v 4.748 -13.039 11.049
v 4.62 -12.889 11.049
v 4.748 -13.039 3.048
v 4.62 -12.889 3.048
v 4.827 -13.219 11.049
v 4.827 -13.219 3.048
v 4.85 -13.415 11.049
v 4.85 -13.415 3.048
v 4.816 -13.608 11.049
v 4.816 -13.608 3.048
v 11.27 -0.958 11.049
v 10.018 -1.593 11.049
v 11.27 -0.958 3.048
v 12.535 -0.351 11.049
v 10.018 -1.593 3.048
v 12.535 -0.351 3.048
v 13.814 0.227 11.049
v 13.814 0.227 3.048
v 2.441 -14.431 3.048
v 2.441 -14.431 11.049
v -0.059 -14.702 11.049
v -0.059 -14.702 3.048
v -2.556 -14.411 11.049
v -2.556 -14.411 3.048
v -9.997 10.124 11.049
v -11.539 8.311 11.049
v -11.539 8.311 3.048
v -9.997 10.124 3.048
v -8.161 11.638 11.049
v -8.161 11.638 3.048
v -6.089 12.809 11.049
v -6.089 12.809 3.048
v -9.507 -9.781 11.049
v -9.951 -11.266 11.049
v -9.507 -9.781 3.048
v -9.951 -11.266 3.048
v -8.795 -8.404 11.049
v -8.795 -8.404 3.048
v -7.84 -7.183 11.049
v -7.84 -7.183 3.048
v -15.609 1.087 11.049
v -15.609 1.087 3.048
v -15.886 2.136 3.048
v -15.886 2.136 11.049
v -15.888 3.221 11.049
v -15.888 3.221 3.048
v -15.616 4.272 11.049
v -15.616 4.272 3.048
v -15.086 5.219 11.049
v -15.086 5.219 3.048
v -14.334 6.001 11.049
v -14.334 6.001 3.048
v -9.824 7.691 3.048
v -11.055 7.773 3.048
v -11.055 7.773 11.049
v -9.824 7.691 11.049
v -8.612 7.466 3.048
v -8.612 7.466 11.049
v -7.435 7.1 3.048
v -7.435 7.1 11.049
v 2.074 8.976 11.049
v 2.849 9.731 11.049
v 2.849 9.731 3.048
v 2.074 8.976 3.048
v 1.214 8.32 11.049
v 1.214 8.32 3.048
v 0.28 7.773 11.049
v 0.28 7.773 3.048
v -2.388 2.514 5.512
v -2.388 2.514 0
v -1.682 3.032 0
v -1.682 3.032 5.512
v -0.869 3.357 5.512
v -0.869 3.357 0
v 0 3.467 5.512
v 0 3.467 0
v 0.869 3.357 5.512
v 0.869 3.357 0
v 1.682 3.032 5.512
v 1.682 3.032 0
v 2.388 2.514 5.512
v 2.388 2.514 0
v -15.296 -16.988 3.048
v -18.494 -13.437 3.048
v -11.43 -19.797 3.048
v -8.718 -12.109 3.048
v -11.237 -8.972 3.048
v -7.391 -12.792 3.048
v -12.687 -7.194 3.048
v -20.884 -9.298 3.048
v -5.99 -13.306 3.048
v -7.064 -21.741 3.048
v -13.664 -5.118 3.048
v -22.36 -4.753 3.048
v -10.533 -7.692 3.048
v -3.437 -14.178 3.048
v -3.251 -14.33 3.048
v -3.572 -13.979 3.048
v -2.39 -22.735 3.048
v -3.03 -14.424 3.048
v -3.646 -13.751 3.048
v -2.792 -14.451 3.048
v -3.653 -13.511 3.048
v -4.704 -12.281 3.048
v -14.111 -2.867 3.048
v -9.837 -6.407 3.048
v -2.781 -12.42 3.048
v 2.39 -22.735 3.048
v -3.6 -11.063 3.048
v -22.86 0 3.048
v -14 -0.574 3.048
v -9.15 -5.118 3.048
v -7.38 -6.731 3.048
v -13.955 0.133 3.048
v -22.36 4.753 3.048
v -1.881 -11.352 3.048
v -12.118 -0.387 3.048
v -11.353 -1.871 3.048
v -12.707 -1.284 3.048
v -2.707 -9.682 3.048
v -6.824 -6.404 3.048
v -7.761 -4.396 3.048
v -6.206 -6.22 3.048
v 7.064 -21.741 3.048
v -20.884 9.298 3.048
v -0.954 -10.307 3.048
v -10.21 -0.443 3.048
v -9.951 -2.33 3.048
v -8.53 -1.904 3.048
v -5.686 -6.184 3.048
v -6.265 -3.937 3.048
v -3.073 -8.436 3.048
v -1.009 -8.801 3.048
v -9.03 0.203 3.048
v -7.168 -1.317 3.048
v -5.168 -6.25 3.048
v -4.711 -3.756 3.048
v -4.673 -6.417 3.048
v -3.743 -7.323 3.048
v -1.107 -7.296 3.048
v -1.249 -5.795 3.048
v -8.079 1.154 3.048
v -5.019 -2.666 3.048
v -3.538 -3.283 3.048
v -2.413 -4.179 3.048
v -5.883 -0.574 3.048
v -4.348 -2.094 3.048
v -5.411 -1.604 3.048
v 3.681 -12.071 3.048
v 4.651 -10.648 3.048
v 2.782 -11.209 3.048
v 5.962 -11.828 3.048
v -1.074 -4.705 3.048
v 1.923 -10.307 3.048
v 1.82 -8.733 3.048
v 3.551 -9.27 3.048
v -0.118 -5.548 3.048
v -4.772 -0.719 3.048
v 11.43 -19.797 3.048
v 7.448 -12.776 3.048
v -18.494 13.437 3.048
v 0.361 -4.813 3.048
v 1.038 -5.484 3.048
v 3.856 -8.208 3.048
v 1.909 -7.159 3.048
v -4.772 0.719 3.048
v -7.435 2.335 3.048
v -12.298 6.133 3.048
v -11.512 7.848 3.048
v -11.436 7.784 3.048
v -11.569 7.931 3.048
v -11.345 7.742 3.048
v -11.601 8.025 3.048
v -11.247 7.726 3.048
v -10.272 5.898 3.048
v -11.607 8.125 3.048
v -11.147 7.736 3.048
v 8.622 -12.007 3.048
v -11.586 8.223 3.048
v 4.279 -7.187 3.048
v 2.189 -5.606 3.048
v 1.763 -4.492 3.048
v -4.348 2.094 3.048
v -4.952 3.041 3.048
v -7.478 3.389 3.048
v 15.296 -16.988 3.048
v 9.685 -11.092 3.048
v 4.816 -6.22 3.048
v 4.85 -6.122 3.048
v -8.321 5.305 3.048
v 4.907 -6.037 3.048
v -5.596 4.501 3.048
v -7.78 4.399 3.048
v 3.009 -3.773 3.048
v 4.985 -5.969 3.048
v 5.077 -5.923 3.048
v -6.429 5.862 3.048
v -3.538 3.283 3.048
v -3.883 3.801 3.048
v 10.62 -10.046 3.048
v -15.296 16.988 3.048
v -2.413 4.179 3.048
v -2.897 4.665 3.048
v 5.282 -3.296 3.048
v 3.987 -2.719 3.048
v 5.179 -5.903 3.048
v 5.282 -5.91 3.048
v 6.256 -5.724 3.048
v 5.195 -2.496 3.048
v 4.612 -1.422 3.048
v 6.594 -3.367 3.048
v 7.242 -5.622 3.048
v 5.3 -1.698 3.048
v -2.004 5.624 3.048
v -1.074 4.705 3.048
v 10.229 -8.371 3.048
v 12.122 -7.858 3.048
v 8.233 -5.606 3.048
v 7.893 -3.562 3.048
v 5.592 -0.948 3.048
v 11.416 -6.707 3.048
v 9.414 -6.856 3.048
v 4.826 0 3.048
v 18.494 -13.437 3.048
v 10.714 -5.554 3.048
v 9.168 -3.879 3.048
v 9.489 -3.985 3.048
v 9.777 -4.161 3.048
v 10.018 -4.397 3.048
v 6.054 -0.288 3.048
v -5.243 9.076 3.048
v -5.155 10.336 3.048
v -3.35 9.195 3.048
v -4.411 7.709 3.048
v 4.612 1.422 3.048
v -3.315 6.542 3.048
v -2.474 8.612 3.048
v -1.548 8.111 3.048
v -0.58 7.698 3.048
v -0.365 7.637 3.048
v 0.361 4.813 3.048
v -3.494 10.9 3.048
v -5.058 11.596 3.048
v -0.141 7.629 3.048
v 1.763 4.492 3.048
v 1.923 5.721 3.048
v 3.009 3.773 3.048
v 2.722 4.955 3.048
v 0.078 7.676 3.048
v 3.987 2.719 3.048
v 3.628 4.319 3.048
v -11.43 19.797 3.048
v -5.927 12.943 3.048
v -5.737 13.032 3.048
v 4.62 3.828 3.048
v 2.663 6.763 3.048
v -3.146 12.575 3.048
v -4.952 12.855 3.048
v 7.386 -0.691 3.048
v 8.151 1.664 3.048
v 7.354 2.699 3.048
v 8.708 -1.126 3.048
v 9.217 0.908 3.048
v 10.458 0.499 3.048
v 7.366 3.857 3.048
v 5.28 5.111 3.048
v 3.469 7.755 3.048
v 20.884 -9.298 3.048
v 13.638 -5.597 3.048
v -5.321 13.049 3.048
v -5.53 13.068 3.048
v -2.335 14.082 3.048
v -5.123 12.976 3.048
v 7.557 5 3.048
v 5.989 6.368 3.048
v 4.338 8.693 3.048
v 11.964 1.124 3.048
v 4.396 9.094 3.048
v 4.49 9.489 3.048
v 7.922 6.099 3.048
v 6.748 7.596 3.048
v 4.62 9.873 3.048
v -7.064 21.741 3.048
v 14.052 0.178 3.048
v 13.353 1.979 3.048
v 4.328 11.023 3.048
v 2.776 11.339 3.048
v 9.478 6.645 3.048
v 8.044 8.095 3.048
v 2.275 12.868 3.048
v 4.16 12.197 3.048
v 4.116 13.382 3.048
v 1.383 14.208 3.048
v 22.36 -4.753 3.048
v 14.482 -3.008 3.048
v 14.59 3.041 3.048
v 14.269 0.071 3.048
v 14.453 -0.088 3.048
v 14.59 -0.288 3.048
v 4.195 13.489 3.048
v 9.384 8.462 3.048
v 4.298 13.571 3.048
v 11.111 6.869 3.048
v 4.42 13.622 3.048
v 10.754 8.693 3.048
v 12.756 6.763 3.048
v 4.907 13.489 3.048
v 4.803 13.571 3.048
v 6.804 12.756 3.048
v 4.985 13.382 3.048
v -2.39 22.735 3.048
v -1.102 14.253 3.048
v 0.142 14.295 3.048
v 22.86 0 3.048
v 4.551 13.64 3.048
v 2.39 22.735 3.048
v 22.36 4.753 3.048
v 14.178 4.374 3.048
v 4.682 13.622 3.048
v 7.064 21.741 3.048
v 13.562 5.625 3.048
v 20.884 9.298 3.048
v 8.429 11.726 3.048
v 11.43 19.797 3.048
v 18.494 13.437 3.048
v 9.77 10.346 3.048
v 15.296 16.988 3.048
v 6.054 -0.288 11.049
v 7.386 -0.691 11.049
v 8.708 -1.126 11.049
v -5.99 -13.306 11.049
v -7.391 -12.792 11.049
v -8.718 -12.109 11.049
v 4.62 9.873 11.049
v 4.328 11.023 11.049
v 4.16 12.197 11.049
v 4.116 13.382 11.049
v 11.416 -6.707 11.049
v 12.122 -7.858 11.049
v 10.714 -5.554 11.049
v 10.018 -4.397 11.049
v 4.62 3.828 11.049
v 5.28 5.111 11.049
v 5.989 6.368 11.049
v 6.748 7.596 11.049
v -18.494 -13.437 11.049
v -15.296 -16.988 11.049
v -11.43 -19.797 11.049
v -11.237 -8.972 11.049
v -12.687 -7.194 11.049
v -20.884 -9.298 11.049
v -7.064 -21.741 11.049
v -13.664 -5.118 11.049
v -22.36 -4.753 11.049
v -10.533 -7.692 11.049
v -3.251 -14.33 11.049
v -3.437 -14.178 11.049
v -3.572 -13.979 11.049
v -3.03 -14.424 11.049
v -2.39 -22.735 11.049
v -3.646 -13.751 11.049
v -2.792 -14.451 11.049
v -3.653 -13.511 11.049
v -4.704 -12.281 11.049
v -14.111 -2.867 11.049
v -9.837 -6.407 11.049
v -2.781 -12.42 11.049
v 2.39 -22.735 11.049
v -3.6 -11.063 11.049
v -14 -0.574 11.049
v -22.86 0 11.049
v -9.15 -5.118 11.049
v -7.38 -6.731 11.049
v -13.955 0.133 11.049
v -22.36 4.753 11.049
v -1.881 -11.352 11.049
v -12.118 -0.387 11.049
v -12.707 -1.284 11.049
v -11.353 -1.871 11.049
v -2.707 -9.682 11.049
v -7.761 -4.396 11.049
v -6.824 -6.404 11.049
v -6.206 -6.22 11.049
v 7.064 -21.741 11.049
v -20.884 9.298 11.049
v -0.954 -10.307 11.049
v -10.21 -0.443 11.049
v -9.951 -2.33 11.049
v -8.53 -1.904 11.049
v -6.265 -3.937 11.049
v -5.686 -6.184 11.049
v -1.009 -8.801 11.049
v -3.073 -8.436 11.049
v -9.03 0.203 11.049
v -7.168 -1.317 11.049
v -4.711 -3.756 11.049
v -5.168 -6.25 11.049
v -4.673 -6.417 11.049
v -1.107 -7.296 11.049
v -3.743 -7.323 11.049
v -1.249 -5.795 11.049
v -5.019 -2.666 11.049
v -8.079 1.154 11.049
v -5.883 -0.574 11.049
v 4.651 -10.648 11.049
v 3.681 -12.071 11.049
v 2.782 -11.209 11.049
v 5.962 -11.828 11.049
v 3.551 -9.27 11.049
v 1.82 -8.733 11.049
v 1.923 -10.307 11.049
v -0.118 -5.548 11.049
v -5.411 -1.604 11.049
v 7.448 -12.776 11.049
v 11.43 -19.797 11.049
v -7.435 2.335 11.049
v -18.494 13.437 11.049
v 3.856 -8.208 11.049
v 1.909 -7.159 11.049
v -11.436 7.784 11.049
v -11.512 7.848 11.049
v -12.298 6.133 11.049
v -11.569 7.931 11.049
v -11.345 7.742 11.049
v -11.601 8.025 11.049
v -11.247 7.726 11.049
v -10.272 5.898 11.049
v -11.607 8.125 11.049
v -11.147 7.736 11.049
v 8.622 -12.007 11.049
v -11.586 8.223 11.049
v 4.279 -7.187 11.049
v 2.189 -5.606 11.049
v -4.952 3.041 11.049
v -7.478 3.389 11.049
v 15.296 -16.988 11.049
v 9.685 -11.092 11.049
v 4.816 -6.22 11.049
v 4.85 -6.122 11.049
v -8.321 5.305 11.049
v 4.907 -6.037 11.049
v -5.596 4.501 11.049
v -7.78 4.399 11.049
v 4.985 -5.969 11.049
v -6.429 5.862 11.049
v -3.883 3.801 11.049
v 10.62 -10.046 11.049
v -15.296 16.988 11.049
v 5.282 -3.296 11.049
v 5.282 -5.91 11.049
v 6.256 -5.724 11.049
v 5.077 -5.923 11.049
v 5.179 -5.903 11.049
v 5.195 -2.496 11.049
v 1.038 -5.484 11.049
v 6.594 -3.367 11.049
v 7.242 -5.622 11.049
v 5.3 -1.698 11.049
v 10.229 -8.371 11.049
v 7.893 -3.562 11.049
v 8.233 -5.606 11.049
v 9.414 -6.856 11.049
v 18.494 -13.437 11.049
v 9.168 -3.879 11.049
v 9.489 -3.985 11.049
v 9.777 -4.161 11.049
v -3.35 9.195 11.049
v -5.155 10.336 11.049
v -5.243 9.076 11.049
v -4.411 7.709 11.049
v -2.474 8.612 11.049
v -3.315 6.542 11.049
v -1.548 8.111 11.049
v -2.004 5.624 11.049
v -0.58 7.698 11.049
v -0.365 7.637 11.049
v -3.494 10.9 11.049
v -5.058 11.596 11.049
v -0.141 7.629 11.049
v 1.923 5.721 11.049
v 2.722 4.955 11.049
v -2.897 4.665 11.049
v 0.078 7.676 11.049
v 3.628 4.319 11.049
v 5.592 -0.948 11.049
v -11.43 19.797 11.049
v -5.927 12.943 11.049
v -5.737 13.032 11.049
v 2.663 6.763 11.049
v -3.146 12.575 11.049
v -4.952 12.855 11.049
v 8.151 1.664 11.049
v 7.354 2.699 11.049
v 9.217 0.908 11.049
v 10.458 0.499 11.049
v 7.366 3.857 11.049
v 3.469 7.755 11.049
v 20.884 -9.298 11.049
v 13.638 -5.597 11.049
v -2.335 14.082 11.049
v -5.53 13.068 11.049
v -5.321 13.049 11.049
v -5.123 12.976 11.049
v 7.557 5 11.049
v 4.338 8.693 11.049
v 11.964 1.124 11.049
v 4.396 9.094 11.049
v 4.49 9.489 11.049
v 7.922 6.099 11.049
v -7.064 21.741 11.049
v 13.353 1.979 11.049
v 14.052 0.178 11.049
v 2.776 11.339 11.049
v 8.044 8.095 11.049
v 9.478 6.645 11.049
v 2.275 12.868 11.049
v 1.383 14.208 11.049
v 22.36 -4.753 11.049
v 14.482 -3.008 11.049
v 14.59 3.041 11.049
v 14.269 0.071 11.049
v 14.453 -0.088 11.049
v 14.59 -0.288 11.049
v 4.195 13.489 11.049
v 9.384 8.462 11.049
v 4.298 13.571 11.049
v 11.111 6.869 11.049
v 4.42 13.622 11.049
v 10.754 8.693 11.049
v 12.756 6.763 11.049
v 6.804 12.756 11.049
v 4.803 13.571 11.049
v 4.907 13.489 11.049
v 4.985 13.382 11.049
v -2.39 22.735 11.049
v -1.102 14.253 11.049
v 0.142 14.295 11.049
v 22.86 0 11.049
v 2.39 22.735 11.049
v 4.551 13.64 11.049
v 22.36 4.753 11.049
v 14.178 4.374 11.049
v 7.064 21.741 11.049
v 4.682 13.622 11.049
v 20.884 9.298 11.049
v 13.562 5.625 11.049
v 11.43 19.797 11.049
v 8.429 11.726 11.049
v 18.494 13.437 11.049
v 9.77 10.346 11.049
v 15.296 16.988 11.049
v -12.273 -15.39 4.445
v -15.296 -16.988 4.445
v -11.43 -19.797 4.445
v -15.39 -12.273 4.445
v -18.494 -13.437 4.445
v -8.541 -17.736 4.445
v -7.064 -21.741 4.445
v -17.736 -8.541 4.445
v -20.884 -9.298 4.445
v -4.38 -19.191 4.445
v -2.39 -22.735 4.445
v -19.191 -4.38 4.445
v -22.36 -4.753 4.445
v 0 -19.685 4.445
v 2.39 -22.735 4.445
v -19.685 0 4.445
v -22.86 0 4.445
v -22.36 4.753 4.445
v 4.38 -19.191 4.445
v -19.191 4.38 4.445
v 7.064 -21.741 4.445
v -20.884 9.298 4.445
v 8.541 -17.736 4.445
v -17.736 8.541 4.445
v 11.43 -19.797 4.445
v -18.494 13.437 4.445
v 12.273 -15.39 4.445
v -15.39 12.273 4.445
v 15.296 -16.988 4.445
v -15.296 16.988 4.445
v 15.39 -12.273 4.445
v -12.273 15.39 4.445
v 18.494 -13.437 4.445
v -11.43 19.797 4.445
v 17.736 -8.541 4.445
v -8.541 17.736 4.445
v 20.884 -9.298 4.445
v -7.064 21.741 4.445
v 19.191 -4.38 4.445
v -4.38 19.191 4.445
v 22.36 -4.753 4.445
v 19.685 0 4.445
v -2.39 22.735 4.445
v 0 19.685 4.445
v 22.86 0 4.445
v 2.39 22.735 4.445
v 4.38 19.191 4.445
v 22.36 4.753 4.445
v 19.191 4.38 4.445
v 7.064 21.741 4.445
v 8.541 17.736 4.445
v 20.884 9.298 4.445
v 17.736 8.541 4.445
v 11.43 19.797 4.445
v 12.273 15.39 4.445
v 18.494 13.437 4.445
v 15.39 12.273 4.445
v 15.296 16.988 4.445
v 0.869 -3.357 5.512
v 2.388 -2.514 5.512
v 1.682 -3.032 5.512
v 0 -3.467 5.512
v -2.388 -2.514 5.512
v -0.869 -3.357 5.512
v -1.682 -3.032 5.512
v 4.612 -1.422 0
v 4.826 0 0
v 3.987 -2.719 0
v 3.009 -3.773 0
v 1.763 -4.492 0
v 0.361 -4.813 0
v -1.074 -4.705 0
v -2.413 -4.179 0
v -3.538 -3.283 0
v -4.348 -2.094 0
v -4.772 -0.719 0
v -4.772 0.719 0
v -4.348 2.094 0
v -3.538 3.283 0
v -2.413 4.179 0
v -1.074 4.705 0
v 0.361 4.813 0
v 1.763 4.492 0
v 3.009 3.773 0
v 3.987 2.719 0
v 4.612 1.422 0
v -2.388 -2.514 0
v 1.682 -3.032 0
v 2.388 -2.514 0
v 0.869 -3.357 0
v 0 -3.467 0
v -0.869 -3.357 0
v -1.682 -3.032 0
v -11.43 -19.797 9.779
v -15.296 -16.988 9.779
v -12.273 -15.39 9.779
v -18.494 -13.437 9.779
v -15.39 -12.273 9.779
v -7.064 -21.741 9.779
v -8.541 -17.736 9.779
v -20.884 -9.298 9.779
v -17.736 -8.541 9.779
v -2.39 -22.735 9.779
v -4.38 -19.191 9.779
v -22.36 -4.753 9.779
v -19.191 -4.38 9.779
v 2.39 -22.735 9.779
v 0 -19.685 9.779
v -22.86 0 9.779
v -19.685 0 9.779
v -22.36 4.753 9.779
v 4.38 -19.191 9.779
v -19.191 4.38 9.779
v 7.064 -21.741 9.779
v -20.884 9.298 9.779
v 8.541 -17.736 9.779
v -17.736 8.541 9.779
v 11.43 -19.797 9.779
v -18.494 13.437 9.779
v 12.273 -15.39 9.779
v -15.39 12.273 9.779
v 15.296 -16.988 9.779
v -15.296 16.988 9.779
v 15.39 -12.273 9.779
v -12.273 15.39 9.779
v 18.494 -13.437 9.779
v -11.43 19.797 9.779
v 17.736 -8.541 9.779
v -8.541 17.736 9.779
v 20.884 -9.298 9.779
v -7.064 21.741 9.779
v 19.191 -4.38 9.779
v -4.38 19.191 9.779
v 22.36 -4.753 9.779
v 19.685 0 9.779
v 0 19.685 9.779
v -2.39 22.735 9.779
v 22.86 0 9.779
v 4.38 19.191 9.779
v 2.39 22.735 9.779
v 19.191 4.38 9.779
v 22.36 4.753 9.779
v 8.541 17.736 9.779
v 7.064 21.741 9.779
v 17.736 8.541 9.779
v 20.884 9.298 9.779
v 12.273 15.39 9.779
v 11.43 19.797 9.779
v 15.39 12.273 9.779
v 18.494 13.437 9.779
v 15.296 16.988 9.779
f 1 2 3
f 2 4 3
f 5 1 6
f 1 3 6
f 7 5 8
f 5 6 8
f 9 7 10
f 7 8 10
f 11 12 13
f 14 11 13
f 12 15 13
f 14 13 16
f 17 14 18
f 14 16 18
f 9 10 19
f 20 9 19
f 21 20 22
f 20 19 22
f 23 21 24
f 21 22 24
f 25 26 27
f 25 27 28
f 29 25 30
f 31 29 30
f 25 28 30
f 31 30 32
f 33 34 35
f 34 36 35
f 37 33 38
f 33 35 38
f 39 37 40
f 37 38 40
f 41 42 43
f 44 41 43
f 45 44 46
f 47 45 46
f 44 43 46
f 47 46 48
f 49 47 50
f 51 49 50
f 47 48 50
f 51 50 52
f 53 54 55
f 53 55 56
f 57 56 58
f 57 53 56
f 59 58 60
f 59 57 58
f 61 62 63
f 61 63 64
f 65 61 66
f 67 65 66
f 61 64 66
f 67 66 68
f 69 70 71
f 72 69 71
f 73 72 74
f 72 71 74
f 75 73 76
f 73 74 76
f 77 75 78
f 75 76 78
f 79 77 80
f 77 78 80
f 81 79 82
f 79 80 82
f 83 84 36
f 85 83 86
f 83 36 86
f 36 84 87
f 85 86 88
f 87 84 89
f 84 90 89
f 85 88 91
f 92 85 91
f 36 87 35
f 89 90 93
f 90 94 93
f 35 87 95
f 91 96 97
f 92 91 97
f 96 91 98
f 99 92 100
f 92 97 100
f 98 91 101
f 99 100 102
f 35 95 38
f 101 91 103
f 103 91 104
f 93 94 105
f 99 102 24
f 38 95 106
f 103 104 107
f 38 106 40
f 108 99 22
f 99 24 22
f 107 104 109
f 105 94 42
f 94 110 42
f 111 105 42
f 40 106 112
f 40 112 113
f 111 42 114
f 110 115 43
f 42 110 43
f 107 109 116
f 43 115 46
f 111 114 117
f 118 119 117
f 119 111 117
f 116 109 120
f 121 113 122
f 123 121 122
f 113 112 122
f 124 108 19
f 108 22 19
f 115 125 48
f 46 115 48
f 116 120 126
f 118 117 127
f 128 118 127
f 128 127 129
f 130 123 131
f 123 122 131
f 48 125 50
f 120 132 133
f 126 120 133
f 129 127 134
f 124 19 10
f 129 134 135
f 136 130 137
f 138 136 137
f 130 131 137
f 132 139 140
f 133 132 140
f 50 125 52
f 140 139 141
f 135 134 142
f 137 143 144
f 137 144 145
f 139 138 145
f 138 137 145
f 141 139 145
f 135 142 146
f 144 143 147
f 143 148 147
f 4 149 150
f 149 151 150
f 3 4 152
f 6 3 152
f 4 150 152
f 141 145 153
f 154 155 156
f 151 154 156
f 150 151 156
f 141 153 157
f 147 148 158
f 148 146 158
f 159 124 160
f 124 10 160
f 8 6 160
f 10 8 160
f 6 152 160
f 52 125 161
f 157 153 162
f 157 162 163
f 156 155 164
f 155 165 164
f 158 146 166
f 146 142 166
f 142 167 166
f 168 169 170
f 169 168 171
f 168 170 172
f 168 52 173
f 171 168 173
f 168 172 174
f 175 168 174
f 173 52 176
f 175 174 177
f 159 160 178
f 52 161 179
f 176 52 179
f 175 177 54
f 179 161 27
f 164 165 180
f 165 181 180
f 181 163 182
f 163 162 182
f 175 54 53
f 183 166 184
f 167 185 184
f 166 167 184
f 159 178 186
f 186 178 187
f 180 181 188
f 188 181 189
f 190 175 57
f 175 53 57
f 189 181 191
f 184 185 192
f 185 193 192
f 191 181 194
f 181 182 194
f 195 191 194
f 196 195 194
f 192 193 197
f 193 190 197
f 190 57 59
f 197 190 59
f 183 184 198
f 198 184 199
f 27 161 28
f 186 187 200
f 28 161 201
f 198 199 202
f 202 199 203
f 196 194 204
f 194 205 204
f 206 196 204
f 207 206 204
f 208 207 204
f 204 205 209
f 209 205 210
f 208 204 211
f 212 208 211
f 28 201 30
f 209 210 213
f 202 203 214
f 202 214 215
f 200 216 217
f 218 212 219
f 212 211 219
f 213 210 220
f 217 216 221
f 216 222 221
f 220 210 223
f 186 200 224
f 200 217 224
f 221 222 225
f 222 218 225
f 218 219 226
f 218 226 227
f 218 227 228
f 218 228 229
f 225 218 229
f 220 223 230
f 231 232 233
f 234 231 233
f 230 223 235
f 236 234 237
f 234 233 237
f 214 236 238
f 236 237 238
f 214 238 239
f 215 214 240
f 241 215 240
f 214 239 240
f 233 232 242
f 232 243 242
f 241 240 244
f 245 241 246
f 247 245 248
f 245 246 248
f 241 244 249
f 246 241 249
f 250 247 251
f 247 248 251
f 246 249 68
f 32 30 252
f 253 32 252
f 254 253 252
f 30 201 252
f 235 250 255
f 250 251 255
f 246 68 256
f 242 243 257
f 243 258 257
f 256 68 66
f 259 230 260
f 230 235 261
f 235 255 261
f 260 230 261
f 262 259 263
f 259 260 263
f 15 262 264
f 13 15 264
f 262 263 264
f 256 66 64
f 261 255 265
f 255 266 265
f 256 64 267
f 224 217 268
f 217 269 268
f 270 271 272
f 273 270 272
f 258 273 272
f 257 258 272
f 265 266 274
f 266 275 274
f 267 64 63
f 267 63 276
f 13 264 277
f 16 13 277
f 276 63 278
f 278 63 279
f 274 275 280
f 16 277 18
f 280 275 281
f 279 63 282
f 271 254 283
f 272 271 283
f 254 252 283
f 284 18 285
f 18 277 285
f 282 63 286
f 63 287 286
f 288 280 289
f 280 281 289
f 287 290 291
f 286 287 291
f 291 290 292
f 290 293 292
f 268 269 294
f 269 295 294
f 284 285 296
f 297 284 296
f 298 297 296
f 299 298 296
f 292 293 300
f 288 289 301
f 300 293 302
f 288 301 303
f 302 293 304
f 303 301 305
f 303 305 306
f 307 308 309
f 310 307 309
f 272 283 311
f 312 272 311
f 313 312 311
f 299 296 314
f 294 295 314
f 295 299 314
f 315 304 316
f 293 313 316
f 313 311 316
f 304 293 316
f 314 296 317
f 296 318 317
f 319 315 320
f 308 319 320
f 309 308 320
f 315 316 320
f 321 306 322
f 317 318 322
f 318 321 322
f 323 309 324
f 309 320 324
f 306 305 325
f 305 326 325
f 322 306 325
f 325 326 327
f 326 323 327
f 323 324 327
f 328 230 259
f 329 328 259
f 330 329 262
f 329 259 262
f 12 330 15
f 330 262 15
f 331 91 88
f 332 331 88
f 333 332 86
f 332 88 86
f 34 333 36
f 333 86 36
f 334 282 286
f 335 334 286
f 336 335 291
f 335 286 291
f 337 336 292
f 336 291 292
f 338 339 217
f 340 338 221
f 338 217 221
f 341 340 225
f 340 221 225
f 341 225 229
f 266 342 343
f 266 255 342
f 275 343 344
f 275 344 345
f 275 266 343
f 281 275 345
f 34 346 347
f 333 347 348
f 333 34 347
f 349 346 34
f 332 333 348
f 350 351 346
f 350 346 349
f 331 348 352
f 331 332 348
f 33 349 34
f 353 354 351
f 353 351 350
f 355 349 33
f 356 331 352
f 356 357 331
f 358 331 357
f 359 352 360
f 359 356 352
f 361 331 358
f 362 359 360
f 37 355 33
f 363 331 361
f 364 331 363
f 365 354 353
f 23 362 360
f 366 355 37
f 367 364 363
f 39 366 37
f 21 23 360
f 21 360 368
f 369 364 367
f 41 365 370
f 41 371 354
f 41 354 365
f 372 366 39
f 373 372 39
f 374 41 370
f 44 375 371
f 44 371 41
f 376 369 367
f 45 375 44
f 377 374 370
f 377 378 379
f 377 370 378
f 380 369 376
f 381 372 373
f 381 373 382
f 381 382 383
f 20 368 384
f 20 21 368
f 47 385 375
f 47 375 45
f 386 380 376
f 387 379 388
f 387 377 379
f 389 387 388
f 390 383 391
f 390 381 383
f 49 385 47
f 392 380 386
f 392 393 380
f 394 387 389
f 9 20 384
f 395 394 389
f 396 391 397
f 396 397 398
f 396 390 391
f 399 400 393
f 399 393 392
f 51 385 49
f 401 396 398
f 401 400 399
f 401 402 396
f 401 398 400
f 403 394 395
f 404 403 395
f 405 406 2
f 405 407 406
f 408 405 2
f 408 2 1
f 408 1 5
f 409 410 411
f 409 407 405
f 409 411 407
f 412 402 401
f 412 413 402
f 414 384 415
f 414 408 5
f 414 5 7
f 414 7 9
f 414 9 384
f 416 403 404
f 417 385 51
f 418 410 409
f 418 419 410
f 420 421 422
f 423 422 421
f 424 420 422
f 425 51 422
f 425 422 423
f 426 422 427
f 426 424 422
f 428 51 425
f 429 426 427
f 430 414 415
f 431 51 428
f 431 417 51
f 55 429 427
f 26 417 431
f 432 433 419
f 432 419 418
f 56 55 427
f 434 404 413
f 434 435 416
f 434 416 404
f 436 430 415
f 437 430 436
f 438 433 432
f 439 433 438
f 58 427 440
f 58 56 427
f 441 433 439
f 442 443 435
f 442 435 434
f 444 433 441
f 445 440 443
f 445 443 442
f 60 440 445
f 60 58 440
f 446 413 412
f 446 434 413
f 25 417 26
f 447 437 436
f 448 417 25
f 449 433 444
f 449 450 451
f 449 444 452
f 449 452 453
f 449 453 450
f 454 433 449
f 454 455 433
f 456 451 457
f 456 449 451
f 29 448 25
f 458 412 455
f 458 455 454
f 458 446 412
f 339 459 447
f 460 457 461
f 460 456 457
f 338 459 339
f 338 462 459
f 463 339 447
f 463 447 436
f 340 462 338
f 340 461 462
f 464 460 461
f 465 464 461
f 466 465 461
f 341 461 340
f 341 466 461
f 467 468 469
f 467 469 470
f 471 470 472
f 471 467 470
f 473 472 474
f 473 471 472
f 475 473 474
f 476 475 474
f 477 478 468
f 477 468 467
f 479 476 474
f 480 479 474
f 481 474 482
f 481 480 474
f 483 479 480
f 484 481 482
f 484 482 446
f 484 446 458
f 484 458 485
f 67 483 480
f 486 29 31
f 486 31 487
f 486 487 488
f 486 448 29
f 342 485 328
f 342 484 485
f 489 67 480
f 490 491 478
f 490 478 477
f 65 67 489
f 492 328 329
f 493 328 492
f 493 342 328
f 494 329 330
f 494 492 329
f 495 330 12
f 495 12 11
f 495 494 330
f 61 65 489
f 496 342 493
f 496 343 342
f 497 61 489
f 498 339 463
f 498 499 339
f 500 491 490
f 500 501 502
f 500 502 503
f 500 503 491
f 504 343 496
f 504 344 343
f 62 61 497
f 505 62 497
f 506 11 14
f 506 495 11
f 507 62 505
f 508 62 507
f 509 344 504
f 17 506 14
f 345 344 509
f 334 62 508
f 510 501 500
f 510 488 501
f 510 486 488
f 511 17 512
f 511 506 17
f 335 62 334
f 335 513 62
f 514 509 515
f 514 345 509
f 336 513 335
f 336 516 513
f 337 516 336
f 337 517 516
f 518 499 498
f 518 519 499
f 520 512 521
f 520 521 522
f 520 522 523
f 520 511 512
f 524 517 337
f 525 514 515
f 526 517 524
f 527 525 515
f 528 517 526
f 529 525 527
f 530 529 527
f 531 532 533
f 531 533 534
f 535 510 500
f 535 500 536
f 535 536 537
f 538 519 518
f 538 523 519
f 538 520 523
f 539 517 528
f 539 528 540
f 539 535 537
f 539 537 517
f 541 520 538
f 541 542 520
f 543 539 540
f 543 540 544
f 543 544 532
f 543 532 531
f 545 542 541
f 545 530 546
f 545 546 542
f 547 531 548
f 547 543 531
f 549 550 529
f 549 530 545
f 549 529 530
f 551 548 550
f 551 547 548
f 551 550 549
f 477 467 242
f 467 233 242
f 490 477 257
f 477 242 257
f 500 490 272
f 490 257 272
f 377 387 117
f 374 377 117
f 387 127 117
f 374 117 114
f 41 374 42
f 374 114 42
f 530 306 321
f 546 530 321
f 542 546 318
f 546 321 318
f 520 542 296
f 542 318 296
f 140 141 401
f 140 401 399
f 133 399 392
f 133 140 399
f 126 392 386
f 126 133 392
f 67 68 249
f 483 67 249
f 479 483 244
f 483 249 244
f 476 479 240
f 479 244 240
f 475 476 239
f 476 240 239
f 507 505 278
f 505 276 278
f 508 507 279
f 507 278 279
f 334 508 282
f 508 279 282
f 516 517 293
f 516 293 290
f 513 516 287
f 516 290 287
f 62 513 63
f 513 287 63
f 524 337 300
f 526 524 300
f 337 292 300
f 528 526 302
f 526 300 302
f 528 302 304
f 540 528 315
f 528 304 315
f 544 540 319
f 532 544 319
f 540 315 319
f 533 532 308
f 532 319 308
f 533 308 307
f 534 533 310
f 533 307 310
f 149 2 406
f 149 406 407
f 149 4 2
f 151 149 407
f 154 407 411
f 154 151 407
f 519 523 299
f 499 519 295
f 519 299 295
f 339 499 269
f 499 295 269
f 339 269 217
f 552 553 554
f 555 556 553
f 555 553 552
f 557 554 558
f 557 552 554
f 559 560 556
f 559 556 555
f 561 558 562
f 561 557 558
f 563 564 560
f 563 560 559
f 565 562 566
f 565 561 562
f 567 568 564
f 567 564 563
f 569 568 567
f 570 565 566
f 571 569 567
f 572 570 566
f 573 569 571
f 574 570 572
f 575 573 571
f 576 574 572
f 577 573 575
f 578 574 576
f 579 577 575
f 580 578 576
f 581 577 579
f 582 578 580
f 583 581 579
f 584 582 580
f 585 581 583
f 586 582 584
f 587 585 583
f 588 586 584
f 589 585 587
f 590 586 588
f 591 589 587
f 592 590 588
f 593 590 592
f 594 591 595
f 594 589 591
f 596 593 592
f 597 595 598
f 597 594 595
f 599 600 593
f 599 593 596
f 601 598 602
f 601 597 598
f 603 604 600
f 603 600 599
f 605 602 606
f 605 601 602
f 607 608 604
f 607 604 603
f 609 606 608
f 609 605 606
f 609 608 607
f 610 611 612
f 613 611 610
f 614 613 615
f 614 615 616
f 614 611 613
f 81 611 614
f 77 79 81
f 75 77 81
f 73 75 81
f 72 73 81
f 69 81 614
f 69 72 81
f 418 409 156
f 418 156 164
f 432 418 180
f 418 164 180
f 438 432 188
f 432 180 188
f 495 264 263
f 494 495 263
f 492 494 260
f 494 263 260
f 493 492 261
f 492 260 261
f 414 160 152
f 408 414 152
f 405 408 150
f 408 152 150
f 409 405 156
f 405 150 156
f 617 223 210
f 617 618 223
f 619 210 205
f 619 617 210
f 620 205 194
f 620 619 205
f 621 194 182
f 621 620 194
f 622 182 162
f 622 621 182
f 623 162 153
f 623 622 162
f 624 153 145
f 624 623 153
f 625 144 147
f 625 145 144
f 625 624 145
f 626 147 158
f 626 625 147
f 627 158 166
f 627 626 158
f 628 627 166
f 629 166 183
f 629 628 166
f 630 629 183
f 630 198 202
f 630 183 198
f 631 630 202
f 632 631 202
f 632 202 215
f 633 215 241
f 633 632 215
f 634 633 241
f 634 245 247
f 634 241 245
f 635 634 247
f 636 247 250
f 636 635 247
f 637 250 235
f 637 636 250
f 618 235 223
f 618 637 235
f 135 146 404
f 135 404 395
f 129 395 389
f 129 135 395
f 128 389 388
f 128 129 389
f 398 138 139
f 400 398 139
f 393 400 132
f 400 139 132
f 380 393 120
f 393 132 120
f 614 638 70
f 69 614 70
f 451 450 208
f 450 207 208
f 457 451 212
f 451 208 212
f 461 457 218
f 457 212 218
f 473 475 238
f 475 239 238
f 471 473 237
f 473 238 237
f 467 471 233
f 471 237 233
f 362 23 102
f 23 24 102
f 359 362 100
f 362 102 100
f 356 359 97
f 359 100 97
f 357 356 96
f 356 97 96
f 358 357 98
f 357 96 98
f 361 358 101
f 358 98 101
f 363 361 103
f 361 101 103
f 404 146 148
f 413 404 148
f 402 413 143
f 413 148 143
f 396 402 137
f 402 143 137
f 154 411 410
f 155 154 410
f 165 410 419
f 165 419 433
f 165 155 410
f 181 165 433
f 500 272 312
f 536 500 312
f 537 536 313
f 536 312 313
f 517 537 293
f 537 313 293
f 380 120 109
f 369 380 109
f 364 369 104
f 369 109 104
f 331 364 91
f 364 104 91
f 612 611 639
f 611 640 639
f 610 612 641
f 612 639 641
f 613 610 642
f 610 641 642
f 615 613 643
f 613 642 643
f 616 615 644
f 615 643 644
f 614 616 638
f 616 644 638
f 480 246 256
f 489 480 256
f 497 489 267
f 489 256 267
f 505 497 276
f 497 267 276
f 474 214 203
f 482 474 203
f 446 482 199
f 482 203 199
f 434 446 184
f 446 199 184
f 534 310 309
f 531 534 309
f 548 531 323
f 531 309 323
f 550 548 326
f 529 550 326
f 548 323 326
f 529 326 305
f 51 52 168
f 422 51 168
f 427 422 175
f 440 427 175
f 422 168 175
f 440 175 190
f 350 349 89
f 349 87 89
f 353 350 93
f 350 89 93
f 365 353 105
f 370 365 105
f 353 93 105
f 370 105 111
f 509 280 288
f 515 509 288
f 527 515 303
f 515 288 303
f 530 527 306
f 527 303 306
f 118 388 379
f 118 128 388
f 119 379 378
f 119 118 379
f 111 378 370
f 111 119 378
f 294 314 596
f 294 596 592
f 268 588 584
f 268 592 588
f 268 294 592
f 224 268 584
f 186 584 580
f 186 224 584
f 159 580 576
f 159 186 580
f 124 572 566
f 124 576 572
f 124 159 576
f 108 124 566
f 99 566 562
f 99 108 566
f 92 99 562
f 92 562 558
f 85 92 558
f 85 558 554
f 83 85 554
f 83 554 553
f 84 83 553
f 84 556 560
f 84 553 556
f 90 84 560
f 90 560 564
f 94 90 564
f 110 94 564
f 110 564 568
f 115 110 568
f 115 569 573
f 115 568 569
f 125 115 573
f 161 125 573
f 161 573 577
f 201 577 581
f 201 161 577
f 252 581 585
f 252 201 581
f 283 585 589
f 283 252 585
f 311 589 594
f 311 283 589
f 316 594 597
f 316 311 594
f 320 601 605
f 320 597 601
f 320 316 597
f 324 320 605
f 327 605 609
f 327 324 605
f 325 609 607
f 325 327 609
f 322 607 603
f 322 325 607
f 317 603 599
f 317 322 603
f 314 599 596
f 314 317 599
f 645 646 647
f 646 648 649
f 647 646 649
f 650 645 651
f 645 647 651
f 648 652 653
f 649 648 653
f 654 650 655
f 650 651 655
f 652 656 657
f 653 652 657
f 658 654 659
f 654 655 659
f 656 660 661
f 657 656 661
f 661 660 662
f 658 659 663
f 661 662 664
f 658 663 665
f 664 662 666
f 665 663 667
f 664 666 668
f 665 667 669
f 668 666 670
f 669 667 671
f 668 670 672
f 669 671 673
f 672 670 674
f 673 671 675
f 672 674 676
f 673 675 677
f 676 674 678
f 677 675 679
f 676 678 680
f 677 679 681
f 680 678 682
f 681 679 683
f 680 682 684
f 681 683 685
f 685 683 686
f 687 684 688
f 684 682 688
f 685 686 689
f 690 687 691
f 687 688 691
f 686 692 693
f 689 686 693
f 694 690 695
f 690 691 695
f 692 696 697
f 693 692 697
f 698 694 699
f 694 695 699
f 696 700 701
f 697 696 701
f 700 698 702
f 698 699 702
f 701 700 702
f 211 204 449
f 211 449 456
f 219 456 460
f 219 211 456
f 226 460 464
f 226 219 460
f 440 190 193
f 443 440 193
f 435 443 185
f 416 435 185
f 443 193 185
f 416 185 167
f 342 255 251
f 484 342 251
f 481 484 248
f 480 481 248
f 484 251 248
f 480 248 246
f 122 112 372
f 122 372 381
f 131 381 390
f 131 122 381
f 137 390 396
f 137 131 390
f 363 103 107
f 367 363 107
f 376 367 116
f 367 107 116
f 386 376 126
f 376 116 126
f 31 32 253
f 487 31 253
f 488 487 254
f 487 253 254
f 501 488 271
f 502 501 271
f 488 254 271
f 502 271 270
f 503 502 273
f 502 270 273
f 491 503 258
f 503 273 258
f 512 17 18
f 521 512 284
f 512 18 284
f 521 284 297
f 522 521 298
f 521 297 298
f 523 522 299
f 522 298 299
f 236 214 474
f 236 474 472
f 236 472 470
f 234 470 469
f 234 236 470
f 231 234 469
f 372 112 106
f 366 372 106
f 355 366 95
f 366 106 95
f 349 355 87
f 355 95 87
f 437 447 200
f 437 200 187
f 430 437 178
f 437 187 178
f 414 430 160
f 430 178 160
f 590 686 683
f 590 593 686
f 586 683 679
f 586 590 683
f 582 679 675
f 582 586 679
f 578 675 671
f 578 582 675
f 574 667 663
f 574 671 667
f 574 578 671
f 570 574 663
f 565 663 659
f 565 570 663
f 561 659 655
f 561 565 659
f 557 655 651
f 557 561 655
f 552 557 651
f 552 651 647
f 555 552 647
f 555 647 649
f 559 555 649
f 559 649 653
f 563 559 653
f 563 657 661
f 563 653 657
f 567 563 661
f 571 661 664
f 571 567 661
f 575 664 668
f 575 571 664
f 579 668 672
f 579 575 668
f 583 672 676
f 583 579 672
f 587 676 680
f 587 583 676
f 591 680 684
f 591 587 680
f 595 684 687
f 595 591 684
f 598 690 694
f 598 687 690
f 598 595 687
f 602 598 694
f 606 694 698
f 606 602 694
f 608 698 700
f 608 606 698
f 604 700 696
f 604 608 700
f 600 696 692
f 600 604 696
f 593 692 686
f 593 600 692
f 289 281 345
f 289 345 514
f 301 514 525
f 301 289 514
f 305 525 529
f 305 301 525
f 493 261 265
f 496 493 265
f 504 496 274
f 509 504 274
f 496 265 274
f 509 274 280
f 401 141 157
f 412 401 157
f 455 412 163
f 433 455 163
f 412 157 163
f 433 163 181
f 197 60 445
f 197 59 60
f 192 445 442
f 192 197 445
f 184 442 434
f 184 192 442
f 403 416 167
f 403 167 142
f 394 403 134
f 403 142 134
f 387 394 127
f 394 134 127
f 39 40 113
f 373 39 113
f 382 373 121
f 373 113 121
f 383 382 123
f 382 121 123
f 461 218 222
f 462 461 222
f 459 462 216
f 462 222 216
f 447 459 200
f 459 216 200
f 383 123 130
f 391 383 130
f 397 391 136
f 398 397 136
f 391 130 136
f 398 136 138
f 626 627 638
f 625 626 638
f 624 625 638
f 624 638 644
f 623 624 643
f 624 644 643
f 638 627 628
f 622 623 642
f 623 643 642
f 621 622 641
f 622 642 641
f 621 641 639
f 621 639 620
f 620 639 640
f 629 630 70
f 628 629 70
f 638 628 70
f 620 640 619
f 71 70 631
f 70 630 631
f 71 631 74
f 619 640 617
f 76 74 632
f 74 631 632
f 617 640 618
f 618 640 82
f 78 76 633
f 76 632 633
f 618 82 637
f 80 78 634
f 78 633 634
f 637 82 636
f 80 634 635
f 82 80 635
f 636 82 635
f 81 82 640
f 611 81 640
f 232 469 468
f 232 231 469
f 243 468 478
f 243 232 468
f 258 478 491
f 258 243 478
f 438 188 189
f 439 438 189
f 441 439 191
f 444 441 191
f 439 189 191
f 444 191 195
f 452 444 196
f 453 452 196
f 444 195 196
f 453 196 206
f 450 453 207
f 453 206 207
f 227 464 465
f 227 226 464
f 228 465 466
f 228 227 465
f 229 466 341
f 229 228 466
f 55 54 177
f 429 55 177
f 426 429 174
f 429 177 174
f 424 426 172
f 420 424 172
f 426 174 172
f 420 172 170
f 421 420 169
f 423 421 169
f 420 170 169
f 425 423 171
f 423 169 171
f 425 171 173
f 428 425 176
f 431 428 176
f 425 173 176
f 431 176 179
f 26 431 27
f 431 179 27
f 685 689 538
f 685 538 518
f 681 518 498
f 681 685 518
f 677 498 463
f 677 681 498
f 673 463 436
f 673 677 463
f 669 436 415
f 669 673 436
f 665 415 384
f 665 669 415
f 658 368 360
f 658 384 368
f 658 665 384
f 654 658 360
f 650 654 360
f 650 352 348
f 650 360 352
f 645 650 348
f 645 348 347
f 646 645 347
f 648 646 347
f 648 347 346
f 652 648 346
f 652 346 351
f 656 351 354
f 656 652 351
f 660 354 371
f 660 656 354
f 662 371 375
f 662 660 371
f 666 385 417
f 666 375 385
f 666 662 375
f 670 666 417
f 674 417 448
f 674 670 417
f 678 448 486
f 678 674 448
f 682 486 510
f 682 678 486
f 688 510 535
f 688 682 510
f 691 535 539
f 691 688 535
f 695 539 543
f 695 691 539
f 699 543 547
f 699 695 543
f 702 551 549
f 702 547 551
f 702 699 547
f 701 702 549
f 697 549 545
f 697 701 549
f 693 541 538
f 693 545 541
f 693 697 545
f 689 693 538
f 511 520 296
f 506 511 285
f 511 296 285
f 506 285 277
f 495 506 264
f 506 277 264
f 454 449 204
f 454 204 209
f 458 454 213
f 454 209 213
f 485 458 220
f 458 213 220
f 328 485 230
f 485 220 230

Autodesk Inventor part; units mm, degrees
ref_plane "YZ Plane" through (0, 0, 0) normal (1, 0, 0) x (0, 1, 0)
ref_plane "XZ Plane" through (0, 0, 0) normal (0, 1, 0) x (-1, 0, 0)
ref_plane "XY Plane" through (0, 0, 0) normal (0, 0, 1) x (1, 0, 0)
sketch "Sketch1" plane through (0, 0, 0) normal (0, 0, 1) x (1, 0, 0)
  circle A0 centre (0, 0) radius 4.826
  dimension "d0" = 9.652
extrude "Extrusion1" add sketch "Sketch1" along normal blind 3.048
sketch "Sketch2" plane through (0, 0, 3.048) normal (0, 0, 1) x (1, 0, 0)
  circle A0 centre (0, 0) radius 22.86
  dimension "d3" = 45.72
extrude "Extrusion2" add sketch "Sketch2" along normal blind 1.397
sketch "Sketch4" plane through (0, 0, 4.445) normal (0, 0, 1) x (1, 0, 0)
  circle A0 centre (0, 0) radius 19.685
  dimension "d6" = 39.37
extrude "Extrusion3" add sketch "Sketch4" along normal blind 5.334
sketch "Sketch6" plane through (0, 0, 9.779) normal (0, 0, 1) x (1, 0, 0)
  circle A0 centre (0, 0) radius 4.826 projected
  circle A1 centre (0, 0) radius 22.86
extrude "Extrusion4" add sketch "Sketch6" along normal blind 1.27 contours A0 | A1
sketch "Sketch9" plane through (0, 0, 0) normal (0, 0, -1) x (-1, 0, 0)
  line L0 (2.3876, -2.514) -> (2.3876, 2.514)
  line L1 (-2.3876, 2.514) -> (-2.3876, -2.514)
  line L2 (-1.2735, -3.2247) -> (1.2735, 3.2247) construction
  line L3 (1.2735, -3.2247) -> (-1.2735, 3.2247) construction
  arc A0 (-2.3876, -2.514) -> (2.3876, -2.514) centre (0, 0) ccw
  arc A1 (2.3876, 2.514) -> (-2.3876, 2.514) centre (0, 0) ccw
extrude "Extrusion6" cut sketch "Sketch9" against normal blind 5.5118
sketch "Sketch10" plane through (0, 0, 3.048) normal (0, 0, -1) x (-1, 0, 0)
  arc A0 (6.0888, 12.8089) -> (4.9517, 12.8553) centre (5.4971, 12.2636) ccw
  arc A1 (11.5392, 8.311) -> (6.0888, 12.8089) centre (0.4834, 0.4651) ccw
  arc A2 (11.0546, 7.7734) -> (11.5392, 8.311) centre (11.2368, 8.0964) ccw
  arc A3 (11.0546, 7.7734) -> (7.4347, 7.1004) centre (11.1442, -2.7813) ccw
  circle A4 centre (0, 0) radius 22.86 projected
  arc A5 (5.2433, 9.0758) -> (4.9517, 12.8553) centre (-169.1009, -2.4734) ccw
  arc A6 (2.0036, 5.6242) -> (5.2433, 9.0758) centre (-1.766, 12.4088) ccw
  arc A7 (2.0036, 5.6242) -> (4.9517, 3.0409) centre (11.897, 13.941) ccw
  arc A8 (7.4347, 7.1004) -> (4.9517, 3.0409) centre (16.2062, -1.0536) ccw
  arc A9 (11.2368, -8.9724) -> (14.0004, -0.5744) centre (4.7112, -2.1713) ccw
  arc A10 (9.1497, -5.1175) -> (11.2368, -8.9724) centre (208.9836, 100.5866) ccw
  arc A11 (9.1497, -5.1175) -> (4.7112, -3.7562) centre (4.4946, -12.3784) ccw
  arc A12 (5.8832, -0.5744) -> (4.7112, -3.7562) centre (18.9185, -7.1827) ccw
  arc A13 (5.8832, -0.5744) -> (9.9506, -2.3296) centre (12.8849, 10.061) ccw
  arc A14 (9.9506, -2.3296) -> (14.0004, -0.5744) centre (5.7085, 13.0084) ccw
  arc A15 (9.9506, -11.266) -> (7.84, -7.1827) centre (1.8046, -12.8894) ccw
  arc A16 (7.84, -7.1827) -> (6.2065, -6.2202) centre (5.7633, -8.8398) ccw
  arc A17 (6.2065, -6.2202) -> (4.6733, -6.4168) centre (5.7633, -8.8398) ccw
  arc A18 (4.6733, -6.4168) -> (2.7073, -9.6817) centre (7.7197, -10.4756) ccw
  arc A19 (2.7073, -9.6817) -> (5.9896, -13.3063) centre (11.6592, -4.8738) ccw
  arc A20 (5.9896, -13.3063) -> (9.9506, -11.266) centre (2.5555, -1.7743) ccw
  arc A21 (1.2488, -5.7954) -> (-2.1893, -5.6065) centre (-0.8542, -12.6863) ccw
  arc A22 (1.2488, -5.7954) -> (0.9545, -10.3074) centre (53.2412, -11.4518) ccw
  arc A23 (3.6527, -13.5111) -> (0.9545, -10.3074) centre (-39.0545, -46.7416) ccw
  arc A24 (2.5555, -14.4106) -> (3.6527, -13.5111) centre (2.8151, -13.6083) ccw
  arc A25 (-4.8162, -13.6083) -> (2.5555, -14.4106) centre (0.014, -3.4952) ccw
  arc A26 (-4.6201, -12.8894) -> (-4.8162, -13.6083) centre (-4.1772, -13.3965) ccw
  arc A27 (-4.6201, -12.8894) -> (-1.9227, -10.3074) centre (-21.7976, 7.7557) ccw
  arc A28 (-1.9227, -10.3074) -> (-2.1893, -5.6065) centre (-14.7824, -8.6787) ccw
  arc A29 (-7.4482, -12.7759) -> (-3.5507, -9.27) centre (-12.4495, -3.2965) ccw
  arc A30 (-3.5507, -9.27) -> (-4.8162, -6.2202) centre (-13.041, -11.4205) ccw
  arc A31 (-4.8162, -6.2202) -> (-5.2818, -5.9098) centre (-5.2043, -6.2979) ccw
  arc A32 (-5.2818, -5.9098) -> (-8.2329, -5.6065) centre (-7.9223, -17.09) ccw
  arc A33 (-8.2329, -5.6065) -> (-10.6197, -10.0458) centre (-4.1164, -10.6809) ccw
  arc A34 (-10.6197, -10.0458) -> (-7.4482, -12.7759) centre (-2.1705, -3.4378) ccw
  arc A35 (2.3346, 14.0815) -> (-1.3832, 14.2076) centre (0.0752, 2.3347) ccw
  arc A36 (3.3497, 9.1954) -> (2.3346, 14.0815) centre (-2.4317, 10.5428) ccw
  arc A37 (0.5801, 7.6979) -> (3.3497, 9.1954) centre (-3.4245, 18.4144) ccw
  arc A38 (-2.849, 9.7313) -> (-0.2799, 7.7734) centre (3.746, 15.7205) ccw
  arc A39 (-1.3832, 14.2076) -> (-2.849, 9.7313) centre (3.0799, 10.268) ccw
  arc A40 (-4.6201, 3.8276) -> (-1.9227, 5.7208) centre (-7.3541, 10.5911) ccw
  arc A41 (-4.6201, 3.8276) -> (-6.7475, 7.596) centre (-37.5112, -12.2565) ccw
  arc A42 (-1.9227, 5.7208) -> (-4.3382, 8.6929) centre (-18.3879, -5.1934) ccw
  arc A43 (-4.3382, 8.6929) -> (-4.6201, 9.8732) centre (-8.7751, 8.2571) ccw
  arc A44 (-4.6201, 9.8732) -> (-4.1164, 13.3822) centre (-15.2899, 13.1953) ccw
  arc A45 (-4.1164, 13.3822) -> (-4.9848, 13.3822) centre (-4.5506, 13.1456) ccw
  arc A46 (-4.9848, 13.3822) -> (-10.7538, 8.6929) centre (-3.2343, 5.3353) ccw
  arc A47 (-6.7475, 7.596) -> (-10.7538, 8.6929) centre (-12.3706, -5.0773) ccw
  arc A48 (-7.9223, 6.0993) -> (-12.7557, 6.7633) centre (-11.4073, -1.3439) ccw
  arc A49 (-7.3541, 2.6988) -> (-7.9223, 6.0993) centre (-14.7929, 3.2035) ccw
  arc A50 (-10.4577, 0.4986) -> (-7.3541, 2.6988) centre (-11.2012, 4.8363) ccw
  arc A51 (-14.5898, 3.0409) -> (-10.4577, 0.4986) centre (-7.2589, 10.3268) ccw
  arc A52 (-12.7557, 6.7633) -> (-14.5898, 3.0409) centre (-5.9799, 1.1117) ccw
  arc A53 (-5.2818, -3.2965) -> (-6.0542, -0.2883) centre (-8.5618, -2.5354) ccw
  arc A54 (-6.0542, -0.2883) -> (-10.0183, -1.5931) centre (9.876, -55.3624) ccw
  arc A55 (-5.2818, -3.2965) -> (-9.1684, -3.8787) centre (-5.1947, -17.1417) ccw
  arc A56 (-9.1684, -3.8787) -> (-10.0183, -4.397) centre (-8.8628, -5.3359) ccw
  arc A57 (-10.0183, -1.5931) -> (-13.8141, 0.2266) centre (-38.6644, -56.4801) ccw
  arc A58 (-13.8141, 0.2266) -> (-14.5898, -0.2883) centre (-13.7445, -0.72) ccw
  arc A59 (-14.5898, -0.2883) -> (-12.122, -7.8577) centre (-4.7204, -1.2577) ccw
  arc A60 (-12.122, -7.8577) -> (-10.0183, -4.397) centre (-273.7033, 153.5242) ccw
  arc A61 (-0.2799, 7.7734) -> (0.5801, 7.6979) centre (0.2215, 8.5495) ccw
  arc A62 (8.3209, 5.3046) -> (7.4347, 2.3347) centre (11.6708, 2.6878) ccw
  arc A63 (7.4347, 2.3347) -> (10.2097, -0.443) centre (11.8697, 3.9904) ccw
  arc A64 (14.3339, 6.0011) -> (8.3209, 5.3046) centre (12.587, -5.2209) ccw
  arc A65 (15.6088, 1.087) -> (14.3339, 6.0011) centre (11.6708, 2.6878) ccw
  arc A66 (10.2097, -0.443) -> (15.6088, 1.087) centre (10.9403, 7.27) ccw
extrude "Extrusion7" cut sketch "Sketch10" against normal through all contours A1 A2 A3 A8 A7 A6 A5 A0 | A10 A11 A12 A13 A14 A9 | A20 A19 A18 A17 A16 A15 | A22 A23 A24 A25 A26 A27 A28 A21 | A34 A33 A32 A31 A30 A29 | A36 A37 A61 A38 A39 A35 | A41 A47 A46 A45 A44 A43 A42 A40 | A49 A50 A51 A52 A48 | A55 A56 A60 A59 A58 A57 A54 A53 | A64 A65 A66 A63 A62
properties part number "Desgin on wheel"
